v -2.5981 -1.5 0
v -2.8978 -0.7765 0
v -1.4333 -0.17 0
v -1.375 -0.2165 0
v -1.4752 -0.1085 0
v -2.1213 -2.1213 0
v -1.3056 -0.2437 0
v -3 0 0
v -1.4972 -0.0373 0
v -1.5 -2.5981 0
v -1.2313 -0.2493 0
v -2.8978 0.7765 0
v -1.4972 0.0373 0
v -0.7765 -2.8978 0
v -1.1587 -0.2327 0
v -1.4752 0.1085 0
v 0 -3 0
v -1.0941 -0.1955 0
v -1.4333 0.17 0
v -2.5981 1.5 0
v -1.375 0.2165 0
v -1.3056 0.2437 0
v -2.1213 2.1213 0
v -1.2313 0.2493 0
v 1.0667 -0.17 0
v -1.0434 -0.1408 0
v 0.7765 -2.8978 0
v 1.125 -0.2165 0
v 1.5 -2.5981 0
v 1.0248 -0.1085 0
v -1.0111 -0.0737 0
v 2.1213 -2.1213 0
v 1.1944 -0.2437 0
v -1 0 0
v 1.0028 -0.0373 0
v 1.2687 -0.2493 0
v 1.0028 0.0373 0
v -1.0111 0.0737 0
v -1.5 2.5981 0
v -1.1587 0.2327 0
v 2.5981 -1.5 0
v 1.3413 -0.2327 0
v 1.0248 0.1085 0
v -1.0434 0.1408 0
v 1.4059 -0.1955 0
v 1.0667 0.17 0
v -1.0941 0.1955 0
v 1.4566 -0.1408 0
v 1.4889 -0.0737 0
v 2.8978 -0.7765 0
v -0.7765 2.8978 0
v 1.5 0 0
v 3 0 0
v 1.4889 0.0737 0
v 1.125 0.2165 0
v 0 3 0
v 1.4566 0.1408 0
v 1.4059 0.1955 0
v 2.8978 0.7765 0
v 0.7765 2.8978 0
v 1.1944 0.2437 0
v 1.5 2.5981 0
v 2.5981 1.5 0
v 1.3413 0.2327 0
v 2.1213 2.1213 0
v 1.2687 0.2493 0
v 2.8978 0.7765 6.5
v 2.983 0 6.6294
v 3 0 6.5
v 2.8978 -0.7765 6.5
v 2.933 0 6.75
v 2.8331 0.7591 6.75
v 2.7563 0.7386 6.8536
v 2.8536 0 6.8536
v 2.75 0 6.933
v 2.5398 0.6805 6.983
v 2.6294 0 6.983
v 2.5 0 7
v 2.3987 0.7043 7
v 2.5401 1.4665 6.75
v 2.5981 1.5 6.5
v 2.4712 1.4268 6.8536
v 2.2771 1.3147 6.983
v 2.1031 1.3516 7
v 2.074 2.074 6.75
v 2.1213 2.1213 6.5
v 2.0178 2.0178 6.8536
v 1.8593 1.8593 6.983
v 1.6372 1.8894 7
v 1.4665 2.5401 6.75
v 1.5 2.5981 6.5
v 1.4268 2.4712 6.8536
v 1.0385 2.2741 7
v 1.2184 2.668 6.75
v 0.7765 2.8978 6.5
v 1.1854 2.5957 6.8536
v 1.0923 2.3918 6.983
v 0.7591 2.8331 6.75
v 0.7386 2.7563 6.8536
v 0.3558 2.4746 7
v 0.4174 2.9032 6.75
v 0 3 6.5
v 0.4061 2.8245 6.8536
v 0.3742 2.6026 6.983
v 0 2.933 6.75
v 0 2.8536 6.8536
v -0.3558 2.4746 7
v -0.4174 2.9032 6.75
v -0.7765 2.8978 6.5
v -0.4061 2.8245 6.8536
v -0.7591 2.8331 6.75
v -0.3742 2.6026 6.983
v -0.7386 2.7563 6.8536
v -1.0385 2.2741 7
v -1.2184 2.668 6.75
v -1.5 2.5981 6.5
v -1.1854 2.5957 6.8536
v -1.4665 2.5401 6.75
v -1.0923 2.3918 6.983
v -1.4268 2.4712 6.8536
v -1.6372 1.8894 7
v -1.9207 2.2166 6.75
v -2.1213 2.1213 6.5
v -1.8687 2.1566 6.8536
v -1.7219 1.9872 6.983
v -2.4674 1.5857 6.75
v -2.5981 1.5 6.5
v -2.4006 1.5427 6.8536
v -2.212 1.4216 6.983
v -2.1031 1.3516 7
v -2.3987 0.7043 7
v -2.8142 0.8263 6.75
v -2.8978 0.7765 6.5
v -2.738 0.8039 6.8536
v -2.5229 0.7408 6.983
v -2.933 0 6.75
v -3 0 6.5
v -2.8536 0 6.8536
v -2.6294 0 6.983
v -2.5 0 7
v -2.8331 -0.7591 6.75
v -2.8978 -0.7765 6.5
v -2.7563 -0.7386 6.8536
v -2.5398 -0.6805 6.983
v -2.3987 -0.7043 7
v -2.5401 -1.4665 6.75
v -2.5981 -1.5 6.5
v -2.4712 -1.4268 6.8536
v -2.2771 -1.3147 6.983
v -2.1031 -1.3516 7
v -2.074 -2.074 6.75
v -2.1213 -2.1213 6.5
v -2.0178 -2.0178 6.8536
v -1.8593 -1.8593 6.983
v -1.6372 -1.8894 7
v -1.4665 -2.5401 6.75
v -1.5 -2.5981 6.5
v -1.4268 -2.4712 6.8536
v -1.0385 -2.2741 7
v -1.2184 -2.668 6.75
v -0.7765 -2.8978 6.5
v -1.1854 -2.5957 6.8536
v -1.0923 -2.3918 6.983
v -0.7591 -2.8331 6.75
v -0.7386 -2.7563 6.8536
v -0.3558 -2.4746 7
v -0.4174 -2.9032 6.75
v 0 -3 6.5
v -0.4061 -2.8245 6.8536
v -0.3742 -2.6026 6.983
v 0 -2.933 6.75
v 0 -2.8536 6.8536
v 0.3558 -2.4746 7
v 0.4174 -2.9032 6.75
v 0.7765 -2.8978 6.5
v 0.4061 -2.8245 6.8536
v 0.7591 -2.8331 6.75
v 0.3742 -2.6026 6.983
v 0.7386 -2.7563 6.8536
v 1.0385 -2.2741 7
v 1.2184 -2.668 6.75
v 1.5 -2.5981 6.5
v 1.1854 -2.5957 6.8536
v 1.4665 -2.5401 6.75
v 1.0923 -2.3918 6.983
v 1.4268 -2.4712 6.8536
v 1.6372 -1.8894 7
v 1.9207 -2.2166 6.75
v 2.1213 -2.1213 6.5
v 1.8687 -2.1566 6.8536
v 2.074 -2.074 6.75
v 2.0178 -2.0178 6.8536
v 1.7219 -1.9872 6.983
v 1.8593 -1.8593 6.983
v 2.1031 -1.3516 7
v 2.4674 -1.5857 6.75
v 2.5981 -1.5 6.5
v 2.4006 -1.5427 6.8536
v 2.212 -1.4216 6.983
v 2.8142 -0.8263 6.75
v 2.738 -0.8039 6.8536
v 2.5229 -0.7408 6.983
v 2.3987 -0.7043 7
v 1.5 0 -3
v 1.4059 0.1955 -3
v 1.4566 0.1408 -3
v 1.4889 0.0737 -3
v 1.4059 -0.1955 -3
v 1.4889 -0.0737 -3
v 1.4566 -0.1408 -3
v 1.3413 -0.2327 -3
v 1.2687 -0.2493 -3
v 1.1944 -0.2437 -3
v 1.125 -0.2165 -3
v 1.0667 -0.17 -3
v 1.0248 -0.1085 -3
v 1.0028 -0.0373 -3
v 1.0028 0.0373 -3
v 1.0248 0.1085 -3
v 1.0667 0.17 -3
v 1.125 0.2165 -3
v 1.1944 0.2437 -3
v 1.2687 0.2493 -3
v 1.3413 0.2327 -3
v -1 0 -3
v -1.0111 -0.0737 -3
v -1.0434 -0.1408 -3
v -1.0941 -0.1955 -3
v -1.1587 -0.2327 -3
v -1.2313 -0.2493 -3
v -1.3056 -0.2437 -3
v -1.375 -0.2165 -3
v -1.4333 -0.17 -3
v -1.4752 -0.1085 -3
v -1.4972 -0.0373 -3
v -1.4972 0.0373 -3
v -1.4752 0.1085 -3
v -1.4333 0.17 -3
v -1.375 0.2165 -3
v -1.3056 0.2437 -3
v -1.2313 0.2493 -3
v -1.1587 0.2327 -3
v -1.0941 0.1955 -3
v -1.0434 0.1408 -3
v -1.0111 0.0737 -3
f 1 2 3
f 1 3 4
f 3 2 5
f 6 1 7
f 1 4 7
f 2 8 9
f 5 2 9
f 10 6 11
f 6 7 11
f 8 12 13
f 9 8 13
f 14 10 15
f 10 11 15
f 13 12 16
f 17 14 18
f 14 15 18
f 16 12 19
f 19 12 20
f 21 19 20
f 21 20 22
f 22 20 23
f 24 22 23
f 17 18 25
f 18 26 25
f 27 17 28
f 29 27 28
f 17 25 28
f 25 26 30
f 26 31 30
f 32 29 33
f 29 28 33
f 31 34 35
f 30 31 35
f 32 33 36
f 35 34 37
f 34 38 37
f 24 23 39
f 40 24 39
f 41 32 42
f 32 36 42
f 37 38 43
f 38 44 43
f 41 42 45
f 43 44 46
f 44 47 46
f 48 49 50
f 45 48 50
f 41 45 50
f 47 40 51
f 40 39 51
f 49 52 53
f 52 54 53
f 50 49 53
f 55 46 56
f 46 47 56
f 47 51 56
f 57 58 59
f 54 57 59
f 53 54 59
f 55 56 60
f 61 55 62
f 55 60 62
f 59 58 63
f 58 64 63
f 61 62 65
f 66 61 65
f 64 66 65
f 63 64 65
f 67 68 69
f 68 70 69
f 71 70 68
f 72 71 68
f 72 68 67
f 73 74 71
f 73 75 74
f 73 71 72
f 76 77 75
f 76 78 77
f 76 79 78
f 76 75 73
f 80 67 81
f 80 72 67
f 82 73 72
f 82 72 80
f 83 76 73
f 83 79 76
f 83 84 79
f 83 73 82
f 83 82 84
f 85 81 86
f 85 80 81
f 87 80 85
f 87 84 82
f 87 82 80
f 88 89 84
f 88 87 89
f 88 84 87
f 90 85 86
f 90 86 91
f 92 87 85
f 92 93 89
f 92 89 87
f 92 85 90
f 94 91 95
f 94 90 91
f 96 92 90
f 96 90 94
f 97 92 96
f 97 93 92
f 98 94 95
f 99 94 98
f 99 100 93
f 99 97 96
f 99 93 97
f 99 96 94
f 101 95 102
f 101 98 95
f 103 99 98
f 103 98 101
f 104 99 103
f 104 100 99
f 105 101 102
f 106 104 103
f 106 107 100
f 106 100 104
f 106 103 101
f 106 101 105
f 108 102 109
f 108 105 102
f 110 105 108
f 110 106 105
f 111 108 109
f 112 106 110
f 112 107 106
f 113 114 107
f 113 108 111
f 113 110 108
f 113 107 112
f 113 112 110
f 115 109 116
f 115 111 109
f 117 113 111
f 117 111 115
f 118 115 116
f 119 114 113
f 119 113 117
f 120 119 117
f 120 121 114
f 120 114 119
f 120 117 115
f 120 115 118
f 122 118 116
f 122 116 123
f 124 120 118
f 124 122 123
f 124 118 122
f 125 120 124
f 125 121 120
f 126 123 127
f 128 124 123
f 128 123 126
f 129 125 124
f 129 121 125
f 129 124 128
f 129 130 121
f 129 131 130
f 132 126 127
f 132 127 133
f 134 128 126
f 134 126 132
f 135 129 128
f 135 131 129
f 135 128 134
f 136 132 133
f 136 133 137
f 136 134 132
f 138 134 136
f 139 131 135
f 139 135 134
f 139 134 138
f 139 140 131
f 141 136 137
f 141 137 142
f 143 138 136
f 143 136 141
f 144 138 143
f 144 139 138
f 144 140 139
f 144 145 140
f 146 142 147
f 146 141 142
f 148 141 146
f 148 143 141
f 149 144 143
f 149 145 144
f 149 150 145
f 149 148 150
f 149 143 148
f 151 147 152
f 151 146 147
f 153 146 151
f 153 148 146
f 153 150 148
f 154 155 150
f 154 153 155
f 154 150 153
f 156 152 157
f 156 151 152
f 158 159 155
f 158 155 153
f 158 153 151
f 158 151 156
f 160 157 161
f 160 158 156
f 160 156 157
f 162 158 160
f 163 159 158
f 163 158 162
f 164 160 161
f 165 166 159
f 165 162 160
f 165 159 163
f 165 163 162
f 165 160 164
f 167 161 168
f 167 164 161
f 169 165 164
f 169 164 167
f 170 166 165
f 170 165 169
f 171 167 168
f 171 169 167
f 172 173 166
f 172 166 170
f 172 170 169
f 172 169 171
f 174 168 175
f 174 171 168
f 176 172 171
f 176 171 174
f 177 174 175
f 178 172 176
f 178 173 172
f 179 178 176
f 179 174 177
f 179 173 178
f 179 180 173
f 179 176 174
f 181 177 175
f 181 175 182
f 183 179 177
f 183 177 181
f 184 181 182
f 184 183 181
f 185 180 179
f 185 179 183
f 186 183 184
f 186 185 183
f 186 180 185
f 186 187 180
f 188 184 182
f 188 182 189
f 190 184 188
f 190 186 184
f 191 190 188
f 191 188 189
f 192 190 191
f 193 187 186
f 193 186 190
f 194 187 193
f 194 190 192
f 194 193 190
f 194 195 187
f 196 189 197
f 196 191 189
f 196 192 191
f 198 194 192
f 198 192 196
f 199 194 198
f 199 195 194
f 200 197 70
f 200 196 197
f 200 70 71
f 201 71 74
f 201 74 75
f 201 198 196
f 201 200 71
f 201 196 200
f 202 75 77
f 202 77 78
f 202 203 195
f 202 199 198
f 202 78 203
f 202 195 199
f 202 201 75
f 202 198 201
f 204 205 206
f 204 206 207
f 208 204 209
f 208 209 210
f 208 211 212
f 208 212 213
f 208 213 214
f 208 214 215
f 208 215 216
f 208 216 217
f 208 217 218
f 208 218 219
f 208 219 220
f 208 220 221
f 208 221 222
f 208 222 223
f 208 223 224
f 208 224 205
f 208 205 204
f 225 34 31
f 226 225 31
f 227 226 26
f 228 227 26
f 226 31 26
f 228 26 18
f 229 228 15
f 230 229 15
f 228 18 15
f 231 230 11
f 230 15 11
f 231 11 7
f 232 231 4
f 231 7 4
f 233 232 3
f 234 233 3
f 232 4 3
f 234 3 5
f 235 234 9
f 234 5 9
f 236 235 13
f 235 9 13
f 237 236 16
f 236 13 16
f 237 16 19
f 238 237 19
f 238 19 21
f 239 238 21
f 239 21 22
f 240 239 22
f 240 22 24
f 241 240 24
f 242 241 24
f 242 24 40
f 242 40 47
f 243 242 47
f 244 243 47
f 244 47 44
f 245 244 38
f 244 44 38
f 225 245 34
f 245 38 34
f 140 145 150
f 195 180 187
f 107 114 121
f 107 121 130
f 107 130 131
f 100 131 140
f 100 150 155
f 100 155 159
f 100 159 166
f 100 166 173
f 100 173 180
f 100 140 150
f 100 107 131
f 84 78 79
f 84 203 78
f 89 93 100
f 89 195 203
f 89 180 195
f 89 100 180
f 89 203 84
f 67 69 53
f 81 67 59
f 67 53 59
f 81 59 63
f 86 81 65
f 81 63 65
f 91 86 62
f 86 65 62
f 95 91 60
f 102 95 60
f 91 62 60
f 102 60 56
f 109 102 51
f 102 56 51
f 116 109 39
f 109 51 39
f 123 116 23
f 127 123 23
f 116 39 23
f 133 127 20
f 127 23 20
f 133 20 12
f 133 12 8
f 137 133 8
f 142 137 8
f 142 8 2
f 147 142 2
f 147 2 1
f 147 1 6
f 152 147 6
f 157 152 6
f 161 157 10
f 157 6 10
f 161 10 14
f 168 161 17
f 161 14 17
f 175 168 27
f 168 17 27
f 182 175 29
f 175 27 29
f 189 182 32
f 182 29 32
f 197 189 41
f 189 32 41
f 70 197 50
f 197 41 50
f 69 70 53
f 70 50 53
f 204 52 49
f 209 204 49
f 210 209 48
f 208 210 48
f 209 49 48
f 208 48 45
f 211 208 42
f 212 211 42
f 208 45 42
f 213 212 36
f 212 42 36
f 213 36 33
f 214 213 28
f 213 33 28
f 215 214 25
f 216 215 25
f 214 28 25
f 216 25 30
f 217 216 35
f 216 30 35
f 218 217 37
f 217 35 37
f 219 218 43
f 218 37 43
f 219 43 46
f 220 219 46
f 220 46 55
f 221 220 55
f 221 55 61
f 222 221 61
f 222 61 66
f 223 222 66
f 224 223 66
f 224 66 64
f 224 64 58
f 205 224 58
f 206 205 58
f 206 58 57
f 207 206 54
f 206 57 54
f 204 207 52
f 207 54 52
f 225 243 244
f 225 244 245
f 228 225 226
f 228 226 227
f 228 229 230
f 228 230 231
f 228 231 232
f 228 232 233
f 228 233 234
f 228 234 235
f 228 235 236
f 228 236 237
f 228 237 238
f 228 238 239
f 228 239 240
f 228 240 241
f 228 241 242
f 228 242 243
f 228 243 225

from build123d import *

# Parameters (mm, degrees)
SKETCH_1_R      = 3
EXTRUDE_1_DEPTH = 7
SKETCH_2_R      = 0.25
EXTRUDE_2_DEPTH = 3
FILLET_1_R      = 0.5


with BuildPart() as part:
    # Эскиз1 → Вытянуть1 (new body)
    with BuildSketch(Plane.XY):
        Circle(SKETCH_1_R)
    extrude(amount=EXTRUDE_1_DEPTH)

    # Эскиз2 → Вытянуть2 (add)
    with BuildSketch(Plane(origin=(0, 0, 0), x_dir=(-1, 0, 0), z_dir=(0, 0, -1))):
        with Locations(Location((-1.25, 0, 0), (0, 0, 180))):
            Circle(SKETCH_2_R)
        with Locations(Location((1.25, 0, 0), (0, 0, 180))):
            Circle(SKETCH_2_R)
    extrude(amount=EXTRUDE_2_DEPTH)

    # Скругление1
    fillet_1_edges = [part.edges().sort_by_distance(p)[0] for p in [
        (-3, 0, 7),
    ]]
    fillet(fillet_1_edges, radius=FILLET_1_R)


solid = part.part
